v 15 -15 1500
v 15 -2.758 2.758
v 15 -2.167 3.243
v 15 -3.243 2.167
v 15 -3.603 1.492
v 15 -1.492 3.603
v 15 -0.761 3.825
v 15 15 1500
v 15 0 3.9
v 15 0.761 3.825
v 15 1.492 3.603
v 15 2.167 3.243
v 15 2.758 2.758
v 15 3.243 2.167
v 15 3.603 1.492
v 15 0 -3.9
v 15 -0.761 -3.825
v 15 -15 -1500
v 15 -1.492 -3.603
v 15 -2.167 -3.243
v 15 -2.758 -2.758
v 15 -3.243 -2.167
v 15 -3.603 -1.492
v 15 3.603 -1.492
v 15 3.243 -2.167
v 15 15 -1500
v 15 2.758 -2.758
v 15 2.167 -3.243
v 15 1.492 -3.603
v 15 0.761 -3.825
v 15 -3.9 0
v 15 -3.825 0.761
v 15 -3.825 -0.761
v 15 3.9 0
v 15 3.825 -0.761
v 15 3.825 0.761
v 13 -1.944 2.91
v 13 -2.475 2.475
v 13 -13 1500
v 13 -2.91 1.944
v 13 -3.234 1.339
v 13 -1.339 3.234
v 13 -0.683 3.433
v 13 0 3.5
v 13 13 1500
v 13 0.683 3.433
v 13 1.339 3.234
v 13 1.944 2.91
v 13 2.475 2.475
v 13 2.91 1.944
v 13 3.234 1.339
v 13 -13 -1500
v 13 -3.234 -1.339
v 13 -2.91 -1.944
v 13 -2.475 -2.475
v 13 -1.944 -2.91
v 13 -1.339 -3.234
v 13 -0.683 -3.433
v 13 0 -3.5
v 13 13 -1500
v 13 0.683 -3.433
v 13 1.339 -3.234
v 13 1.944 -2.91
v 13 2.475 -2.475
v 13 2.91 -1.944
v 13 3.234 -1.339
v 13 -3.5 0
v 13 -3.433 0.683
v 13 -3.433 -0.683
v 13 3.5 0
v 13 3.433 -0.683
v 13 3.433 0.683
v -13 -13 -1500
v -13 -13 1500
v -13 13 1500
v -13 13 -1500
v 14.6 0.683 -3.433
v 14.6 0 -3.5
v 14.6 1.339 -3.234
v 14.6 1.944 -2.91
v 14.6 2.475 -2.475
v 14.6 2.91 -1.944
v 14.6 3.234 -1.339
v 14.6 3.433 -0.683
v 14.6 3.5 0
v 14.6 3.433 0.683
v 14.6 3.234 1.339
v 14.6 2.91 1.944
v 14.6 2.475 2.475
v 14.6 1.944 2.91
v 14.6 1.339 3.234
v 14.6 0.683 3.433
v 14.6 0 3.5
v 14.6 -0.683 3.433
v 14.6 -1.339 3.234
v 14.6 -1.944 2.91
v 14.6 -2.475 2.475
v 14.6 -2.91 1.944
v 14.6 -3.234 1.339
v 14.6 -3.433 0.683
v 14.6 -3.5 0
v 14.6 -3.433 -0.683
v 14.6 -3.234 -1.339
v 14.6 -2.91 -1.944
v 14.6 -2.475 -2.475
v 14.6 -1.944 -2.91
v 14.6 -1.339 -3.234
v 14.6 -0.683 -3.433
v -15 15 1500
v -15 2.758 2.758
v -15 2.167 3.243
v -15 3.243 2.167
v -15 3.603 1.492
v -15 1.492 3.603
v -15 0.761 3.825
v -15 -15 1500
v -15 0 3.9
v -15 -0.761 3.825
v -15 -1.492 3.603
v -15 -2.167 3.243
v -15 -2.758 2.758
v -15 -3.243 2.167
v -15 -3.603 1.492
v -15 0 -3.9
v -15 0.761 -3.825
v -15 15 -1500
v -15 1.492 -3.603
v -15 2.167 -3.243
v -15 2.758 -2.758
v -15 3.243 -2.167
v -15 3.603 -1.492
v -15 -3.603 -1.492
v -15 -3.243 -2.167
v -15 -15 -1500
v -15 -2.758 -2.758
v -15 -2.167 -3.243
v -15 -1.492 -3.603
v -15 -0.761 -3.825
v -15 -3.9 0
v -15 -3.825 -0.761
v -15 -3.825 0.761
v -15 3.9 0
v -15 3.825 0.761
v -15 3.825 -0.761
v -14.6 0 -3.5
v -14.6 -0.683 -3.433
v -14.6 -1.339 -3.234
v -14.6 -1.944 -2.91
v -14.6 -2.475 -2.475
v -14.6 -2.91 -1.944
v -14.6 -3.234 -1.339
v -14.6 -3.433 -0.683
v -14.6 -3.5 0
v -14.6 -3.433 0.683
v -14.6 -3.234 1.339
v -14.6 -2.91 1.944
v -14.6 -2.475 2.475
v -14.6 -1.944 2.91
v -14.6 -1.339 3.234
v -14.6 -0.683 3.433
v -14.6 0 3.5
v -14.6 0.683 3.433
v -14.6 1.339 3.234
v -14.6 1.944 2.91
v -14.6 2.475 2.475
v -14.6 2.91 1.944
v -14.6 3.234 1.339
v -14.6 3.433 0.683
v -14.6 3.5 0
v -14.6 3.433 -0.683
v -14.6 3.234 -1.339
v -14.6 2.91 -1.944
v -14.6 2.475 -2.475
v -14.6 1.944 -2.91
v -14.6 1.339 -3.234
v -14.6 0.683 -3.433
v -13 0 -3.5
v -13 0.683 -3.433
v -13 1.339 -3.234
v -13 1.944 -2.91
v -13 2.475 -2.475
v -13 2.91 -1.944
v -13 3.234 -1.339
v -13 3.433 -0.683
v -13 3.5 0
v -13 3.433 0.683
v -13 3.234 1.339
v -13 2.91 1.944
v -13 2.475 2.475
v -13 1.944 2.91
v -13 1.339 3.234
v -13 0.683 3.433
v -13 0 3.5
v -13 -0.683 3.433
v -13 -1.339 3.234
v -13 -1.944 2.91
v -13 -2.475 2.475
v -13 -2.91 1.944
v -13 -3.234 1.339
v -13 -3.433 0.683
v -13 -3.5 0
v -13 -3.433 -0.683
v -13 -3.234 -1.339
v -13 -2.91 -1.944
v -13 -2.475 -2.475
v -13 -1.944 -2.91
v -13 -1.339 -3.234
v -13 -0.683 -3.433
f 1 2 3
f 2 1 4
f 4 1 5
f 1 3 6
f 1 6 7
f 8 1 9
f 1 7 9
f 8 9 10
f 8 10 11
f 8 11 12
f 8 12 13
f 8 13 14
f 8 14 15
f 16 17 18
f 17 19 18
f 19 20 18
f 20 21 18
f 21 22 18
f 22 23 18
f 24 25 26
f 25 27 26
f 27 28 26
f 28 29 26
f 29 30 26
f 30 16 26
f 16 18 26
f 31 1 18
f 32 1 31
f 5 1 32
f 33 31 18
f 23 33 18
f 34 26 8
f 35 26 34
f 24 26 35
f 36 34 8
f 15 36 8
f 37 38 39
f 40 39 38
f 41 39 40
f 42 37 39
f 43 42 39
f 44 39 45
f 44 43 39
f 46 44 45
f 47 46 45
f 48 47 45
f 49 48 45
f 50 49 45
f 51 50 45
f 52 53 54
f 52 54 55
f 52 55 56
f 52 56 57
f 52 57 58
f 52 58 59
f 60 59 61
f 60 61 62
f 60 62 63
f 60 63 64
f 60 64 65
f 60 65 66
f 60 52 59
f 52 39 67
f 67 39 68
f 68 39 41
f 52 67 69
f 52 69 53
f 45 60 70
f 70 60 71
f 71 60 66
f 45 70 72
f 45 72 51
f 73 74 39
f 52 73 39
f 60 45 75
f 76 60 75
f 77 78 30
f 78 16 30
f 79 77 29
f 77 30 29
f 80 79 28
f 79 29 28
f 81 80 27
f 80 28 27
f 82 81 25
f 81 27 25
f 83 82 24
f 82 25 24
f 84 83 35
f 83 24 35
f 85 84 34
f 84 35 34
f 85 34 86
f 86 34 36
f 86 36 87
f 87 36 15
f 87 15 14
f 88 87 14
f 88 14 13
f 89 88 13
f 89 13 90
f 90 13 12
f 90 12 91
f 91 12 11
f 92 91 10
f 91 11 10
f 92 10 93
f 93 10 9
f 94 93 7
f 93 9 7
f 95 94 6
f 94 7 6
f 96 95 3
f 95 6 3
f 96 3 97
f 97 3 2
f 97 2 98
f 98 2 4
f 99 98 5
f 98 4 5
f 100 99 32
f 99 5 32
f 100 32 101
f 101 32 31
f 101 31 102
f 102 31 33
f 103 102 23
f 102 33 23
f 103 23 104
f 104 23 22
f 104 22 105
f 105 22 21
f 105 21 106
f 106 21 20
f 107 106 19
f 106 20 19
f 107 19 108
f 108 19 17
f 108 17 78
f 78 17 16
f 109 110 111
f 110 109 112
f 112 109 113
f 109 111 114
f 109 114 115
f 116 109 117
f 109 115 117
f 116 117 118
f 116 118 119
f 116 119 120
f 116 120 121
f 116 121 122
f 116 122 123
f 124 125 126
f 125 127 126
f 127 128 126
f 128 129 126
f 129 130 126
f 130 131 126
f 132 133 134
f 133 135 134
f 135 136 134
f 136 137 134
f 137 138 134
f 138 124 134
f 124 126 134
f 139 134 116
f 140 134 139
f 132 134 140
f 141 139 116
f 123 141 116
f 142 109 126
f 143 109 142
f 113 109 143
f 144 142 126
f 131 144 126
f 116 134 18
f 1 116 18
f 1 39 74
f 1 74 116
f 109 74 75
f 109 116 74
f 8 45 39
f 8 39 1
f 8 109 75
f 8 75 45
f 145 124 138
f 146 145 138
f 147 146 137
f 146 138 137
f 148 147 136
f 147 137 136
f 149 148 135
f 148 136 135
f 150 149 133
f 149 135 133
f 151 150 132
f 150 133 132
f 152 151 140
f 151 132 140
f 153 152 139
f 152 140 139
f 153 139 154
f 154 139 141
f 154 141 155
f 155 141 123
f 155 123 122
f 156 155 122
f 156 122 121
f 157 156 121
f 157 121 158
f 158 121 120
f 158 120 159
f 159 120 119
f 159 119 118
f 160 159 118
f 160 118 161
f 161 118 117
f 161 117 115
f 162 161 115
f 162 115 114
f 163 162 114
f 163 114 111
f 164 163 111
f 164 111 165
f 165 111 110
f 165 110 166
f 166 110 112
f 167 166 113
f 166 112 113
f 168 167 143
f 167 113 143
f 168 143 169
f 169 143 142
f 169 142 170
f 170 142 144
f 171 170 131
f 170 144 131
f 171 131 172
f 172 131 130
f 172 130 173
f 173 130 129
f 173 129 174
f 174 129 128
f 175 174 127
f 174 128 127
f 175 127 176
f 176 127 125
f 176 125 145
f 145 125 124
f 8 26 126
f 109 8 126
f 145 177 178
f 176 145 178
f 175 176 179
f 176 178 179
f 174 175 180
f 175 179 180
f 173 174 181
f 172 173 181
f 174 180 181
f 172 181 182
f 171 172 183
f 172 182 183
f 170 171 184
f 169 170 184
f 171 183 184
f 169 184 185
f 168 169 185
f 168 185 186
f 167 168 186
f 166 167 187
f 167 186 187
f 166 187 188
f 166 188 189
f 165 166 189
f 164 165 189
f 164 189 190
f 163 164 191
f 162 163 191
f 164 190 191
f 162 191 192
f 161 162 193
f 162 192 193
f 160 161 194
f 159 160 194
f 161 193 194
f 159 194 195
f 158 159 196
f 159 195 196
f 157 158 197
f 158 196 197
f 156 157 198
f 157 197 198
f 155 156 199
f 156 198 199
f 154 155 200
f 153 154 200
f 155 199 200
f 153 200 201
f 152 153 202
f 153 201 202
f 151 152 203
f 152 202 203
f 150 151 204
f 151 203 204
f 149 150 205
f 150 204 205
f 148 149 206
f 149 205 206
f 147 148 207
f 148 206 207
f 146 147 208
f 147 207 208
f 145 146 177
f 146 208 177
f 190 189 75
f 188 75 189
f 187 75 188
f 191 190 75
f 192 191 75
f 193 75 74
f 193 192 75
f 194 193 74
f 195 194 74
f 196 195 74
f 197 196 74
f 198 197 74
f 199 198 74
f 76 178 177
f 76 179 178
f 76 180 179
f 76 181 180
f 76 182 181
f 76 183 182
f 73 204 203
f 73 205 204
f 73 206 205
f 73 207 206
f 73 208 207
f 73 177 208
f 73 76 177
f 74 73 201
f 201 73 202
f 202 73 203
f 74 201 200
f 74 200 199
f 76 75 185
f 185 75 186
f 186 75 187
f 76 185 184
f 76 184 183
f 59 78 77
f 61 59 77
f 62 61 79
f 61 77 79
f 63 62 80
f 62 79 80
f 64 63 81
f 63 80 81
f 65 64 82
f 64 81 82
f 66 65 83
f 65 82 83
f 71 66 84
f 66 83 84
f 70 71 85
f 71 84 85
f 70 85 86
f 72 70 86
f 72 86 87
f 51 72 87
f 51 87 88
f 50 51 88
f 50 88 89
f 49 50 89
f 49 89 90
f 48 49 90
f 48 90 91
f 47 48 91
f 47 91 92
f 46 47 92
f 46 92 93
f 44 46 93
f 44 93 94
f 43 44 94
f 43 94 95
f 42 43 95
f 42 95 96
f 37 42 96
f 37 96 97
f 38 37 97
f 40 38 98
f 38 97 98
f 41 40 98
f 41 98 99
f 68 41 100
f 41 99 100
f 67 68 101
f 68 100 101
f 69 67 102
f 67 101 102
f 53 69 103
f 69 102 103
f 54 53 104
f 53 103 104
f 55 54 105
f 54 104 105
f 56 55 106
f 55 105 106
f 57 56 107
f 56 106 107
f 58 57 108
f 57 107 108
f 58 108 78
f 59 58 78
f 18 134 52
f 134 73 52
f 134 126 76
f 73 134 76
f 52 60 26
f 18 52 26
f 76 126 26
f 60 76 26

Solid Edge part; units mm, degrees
sketch "Sketch1" plane through (0, 0, 0) normal (0, 0, 1) x (1, 0, 0)
  line L0 (-15, -15) -> (15, -15)
  line L1 (15, -15) -> (15, 15)
  line L2 (15, 15) -> (-15, 15)
  line L3 (-15, 15) -> (-15, -15)
  line L4 (-13, -13) -> (13, -13)
  line L5 (13, -13) -> (13, 13)
  line L6 (13, 13) -> (-13, 13)
  line L7 (-13, 13) -> (-13, -13)
  dimension "D1" = 30
  dimension "D2" = 30
  dimension "D3" = 2
extrude "body" add sketch "Sketch1" along normal mid plane 3000
hole "center_hole" at (15, 0, 0) direction (-1, 0, 0) diameter 7 end through all start chamfer 0.4 start chamfer angle 45 end chamfer 0.4 end chamfer angle 45
properties material "Aluminum, 7075-T6"
